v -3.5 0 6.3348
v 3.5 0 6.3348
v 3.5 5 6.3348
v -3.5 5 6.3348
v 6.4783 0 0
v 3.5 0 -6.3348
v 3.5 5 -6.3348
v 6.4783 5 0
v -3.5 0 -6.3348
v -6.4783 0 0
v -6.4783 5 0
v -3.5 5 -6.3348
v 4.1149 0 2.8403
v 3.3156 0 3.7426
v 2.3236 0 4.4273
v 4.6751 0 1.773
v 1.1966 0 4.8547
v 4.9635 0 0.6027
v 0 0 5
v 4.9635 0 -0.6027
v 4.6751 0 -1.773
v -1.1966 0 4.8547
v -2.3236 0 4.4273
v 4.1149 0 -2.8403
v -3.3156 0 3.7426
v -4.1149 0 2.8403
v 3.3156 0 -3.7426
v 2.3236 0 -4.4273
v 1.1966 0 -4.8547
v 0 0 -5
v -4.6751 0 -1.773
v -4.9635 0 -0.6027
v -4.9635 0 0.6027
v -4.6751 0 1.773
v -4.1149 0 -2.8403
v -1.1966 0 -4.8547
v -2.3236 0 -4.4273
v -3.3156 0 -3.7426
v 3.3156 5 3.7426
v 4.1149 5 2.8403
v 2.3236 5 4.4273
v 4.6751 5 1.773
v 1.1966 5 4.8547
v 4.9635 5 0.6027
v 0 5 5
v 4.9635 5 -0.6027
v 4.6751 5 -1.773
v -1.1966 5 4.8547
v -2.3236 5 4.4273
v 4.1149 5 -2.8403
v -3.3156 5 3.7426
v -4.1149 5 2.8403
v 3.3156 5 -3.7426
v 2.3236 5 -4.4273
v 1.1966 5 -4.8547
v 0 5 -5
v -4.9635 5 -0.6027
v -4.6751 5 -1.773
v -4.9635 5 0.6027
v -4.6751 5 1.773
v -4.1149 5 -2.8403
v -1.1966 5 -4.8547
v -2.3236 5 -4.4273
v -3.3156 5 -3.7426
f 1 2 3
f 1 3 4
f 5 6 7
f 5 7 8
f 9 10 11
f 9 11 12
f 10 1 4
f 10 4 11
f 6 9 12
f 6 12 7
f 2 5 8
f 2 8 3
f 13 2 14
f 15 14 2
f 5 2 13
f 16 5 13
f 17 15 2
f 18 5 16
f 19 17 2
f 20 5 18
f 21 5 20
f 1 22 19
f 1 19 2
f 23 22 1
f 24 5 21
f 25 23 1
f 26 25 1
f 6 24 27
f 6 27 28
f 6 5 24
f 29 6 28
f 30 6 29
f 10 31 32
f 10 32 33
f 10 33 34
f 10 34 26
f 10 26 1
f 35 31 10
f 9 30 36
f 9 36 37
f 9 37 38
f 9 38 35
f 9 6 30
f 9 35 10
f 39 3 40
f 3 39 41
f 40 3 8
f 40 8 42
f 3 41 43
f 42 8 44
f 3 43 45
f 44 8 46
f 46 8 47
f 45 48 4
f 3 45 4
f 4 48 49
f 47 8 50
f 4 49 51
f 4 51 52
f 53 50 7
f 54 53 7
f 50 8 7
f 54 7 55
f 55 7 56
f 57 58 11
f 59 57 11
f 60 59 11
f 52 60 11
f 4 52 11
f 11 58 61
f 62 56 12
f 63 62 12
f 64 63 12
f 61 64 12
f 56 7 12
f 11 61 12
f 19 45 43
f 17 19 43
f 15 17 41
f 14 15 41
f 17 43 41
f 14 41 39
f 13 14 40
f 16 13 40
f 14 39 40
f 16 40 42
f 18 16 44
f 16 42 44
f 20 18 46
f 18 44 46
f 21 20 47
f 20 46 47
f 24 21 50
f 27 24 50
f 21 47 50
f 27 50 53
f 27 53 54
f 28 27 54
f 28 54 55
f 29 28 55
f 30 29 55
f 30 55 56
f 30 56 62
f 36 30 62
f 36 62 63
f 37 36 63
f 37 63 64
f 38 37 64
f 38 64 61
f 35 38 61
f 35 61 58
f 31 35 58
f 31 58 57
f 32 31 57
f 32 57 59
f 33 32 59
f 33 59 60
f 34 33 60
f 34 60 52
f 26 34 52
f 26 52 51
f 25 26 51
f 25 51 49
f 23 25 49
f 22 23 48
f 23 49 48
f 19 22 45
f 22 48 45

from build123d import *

# Parameters (mm, degrees)
EXTRUDE_1_DEPTH     = 5
CUT_EXTRUDE_1_REACH = 12.349
SKETCH_2_R          = 5


with BuildPart() as part:
    # 草图1 → 凸台-拉伸1 (new body)
    with BuildSketch(Plane(origin=(0, 0, 0), x_dir=(1, 0, 0), z_dir=(0, 1, 0))):
        Polygon((-6.47832956, 0), (6.47832956, 0), (3.5, -6.334789107), (-3.5, -6.334789107), align=None)
        Polygon((-6.47832956, 0), (-3.5, 6.334789107), (3.5, 6.334789107), (6.47832956, 0), align=None)
    extrude(amount=EXTRUDE_1_DEPTH)

    # 草图2 → 切除-拉伸1 (cut, up to next)
    with BuildSketch(Plane(origin=(0, 5, 0), x_dir=(1, 0, 0), z_dir=(0, 1, 0)), mode=Mode.PRIVATE) as cut_extrude_1_sk1:
        with Locations(Location((0, 0, 0), (0, 0, 270))):
            Circle(SKETCH_2_R)
    cut_extrude_1_tool1 = extrude(cut_extrude_1_sk1.sketch, amount=-CUT_EXTRUDE_1_REACH, mode=Mode.PRIVATE) & part.part
    add(cut_extrude_1_tool1.solids().sort_by_distance((0, 5, 0))[0], mode=Mode.SUBTRACT)


solid = part.part
